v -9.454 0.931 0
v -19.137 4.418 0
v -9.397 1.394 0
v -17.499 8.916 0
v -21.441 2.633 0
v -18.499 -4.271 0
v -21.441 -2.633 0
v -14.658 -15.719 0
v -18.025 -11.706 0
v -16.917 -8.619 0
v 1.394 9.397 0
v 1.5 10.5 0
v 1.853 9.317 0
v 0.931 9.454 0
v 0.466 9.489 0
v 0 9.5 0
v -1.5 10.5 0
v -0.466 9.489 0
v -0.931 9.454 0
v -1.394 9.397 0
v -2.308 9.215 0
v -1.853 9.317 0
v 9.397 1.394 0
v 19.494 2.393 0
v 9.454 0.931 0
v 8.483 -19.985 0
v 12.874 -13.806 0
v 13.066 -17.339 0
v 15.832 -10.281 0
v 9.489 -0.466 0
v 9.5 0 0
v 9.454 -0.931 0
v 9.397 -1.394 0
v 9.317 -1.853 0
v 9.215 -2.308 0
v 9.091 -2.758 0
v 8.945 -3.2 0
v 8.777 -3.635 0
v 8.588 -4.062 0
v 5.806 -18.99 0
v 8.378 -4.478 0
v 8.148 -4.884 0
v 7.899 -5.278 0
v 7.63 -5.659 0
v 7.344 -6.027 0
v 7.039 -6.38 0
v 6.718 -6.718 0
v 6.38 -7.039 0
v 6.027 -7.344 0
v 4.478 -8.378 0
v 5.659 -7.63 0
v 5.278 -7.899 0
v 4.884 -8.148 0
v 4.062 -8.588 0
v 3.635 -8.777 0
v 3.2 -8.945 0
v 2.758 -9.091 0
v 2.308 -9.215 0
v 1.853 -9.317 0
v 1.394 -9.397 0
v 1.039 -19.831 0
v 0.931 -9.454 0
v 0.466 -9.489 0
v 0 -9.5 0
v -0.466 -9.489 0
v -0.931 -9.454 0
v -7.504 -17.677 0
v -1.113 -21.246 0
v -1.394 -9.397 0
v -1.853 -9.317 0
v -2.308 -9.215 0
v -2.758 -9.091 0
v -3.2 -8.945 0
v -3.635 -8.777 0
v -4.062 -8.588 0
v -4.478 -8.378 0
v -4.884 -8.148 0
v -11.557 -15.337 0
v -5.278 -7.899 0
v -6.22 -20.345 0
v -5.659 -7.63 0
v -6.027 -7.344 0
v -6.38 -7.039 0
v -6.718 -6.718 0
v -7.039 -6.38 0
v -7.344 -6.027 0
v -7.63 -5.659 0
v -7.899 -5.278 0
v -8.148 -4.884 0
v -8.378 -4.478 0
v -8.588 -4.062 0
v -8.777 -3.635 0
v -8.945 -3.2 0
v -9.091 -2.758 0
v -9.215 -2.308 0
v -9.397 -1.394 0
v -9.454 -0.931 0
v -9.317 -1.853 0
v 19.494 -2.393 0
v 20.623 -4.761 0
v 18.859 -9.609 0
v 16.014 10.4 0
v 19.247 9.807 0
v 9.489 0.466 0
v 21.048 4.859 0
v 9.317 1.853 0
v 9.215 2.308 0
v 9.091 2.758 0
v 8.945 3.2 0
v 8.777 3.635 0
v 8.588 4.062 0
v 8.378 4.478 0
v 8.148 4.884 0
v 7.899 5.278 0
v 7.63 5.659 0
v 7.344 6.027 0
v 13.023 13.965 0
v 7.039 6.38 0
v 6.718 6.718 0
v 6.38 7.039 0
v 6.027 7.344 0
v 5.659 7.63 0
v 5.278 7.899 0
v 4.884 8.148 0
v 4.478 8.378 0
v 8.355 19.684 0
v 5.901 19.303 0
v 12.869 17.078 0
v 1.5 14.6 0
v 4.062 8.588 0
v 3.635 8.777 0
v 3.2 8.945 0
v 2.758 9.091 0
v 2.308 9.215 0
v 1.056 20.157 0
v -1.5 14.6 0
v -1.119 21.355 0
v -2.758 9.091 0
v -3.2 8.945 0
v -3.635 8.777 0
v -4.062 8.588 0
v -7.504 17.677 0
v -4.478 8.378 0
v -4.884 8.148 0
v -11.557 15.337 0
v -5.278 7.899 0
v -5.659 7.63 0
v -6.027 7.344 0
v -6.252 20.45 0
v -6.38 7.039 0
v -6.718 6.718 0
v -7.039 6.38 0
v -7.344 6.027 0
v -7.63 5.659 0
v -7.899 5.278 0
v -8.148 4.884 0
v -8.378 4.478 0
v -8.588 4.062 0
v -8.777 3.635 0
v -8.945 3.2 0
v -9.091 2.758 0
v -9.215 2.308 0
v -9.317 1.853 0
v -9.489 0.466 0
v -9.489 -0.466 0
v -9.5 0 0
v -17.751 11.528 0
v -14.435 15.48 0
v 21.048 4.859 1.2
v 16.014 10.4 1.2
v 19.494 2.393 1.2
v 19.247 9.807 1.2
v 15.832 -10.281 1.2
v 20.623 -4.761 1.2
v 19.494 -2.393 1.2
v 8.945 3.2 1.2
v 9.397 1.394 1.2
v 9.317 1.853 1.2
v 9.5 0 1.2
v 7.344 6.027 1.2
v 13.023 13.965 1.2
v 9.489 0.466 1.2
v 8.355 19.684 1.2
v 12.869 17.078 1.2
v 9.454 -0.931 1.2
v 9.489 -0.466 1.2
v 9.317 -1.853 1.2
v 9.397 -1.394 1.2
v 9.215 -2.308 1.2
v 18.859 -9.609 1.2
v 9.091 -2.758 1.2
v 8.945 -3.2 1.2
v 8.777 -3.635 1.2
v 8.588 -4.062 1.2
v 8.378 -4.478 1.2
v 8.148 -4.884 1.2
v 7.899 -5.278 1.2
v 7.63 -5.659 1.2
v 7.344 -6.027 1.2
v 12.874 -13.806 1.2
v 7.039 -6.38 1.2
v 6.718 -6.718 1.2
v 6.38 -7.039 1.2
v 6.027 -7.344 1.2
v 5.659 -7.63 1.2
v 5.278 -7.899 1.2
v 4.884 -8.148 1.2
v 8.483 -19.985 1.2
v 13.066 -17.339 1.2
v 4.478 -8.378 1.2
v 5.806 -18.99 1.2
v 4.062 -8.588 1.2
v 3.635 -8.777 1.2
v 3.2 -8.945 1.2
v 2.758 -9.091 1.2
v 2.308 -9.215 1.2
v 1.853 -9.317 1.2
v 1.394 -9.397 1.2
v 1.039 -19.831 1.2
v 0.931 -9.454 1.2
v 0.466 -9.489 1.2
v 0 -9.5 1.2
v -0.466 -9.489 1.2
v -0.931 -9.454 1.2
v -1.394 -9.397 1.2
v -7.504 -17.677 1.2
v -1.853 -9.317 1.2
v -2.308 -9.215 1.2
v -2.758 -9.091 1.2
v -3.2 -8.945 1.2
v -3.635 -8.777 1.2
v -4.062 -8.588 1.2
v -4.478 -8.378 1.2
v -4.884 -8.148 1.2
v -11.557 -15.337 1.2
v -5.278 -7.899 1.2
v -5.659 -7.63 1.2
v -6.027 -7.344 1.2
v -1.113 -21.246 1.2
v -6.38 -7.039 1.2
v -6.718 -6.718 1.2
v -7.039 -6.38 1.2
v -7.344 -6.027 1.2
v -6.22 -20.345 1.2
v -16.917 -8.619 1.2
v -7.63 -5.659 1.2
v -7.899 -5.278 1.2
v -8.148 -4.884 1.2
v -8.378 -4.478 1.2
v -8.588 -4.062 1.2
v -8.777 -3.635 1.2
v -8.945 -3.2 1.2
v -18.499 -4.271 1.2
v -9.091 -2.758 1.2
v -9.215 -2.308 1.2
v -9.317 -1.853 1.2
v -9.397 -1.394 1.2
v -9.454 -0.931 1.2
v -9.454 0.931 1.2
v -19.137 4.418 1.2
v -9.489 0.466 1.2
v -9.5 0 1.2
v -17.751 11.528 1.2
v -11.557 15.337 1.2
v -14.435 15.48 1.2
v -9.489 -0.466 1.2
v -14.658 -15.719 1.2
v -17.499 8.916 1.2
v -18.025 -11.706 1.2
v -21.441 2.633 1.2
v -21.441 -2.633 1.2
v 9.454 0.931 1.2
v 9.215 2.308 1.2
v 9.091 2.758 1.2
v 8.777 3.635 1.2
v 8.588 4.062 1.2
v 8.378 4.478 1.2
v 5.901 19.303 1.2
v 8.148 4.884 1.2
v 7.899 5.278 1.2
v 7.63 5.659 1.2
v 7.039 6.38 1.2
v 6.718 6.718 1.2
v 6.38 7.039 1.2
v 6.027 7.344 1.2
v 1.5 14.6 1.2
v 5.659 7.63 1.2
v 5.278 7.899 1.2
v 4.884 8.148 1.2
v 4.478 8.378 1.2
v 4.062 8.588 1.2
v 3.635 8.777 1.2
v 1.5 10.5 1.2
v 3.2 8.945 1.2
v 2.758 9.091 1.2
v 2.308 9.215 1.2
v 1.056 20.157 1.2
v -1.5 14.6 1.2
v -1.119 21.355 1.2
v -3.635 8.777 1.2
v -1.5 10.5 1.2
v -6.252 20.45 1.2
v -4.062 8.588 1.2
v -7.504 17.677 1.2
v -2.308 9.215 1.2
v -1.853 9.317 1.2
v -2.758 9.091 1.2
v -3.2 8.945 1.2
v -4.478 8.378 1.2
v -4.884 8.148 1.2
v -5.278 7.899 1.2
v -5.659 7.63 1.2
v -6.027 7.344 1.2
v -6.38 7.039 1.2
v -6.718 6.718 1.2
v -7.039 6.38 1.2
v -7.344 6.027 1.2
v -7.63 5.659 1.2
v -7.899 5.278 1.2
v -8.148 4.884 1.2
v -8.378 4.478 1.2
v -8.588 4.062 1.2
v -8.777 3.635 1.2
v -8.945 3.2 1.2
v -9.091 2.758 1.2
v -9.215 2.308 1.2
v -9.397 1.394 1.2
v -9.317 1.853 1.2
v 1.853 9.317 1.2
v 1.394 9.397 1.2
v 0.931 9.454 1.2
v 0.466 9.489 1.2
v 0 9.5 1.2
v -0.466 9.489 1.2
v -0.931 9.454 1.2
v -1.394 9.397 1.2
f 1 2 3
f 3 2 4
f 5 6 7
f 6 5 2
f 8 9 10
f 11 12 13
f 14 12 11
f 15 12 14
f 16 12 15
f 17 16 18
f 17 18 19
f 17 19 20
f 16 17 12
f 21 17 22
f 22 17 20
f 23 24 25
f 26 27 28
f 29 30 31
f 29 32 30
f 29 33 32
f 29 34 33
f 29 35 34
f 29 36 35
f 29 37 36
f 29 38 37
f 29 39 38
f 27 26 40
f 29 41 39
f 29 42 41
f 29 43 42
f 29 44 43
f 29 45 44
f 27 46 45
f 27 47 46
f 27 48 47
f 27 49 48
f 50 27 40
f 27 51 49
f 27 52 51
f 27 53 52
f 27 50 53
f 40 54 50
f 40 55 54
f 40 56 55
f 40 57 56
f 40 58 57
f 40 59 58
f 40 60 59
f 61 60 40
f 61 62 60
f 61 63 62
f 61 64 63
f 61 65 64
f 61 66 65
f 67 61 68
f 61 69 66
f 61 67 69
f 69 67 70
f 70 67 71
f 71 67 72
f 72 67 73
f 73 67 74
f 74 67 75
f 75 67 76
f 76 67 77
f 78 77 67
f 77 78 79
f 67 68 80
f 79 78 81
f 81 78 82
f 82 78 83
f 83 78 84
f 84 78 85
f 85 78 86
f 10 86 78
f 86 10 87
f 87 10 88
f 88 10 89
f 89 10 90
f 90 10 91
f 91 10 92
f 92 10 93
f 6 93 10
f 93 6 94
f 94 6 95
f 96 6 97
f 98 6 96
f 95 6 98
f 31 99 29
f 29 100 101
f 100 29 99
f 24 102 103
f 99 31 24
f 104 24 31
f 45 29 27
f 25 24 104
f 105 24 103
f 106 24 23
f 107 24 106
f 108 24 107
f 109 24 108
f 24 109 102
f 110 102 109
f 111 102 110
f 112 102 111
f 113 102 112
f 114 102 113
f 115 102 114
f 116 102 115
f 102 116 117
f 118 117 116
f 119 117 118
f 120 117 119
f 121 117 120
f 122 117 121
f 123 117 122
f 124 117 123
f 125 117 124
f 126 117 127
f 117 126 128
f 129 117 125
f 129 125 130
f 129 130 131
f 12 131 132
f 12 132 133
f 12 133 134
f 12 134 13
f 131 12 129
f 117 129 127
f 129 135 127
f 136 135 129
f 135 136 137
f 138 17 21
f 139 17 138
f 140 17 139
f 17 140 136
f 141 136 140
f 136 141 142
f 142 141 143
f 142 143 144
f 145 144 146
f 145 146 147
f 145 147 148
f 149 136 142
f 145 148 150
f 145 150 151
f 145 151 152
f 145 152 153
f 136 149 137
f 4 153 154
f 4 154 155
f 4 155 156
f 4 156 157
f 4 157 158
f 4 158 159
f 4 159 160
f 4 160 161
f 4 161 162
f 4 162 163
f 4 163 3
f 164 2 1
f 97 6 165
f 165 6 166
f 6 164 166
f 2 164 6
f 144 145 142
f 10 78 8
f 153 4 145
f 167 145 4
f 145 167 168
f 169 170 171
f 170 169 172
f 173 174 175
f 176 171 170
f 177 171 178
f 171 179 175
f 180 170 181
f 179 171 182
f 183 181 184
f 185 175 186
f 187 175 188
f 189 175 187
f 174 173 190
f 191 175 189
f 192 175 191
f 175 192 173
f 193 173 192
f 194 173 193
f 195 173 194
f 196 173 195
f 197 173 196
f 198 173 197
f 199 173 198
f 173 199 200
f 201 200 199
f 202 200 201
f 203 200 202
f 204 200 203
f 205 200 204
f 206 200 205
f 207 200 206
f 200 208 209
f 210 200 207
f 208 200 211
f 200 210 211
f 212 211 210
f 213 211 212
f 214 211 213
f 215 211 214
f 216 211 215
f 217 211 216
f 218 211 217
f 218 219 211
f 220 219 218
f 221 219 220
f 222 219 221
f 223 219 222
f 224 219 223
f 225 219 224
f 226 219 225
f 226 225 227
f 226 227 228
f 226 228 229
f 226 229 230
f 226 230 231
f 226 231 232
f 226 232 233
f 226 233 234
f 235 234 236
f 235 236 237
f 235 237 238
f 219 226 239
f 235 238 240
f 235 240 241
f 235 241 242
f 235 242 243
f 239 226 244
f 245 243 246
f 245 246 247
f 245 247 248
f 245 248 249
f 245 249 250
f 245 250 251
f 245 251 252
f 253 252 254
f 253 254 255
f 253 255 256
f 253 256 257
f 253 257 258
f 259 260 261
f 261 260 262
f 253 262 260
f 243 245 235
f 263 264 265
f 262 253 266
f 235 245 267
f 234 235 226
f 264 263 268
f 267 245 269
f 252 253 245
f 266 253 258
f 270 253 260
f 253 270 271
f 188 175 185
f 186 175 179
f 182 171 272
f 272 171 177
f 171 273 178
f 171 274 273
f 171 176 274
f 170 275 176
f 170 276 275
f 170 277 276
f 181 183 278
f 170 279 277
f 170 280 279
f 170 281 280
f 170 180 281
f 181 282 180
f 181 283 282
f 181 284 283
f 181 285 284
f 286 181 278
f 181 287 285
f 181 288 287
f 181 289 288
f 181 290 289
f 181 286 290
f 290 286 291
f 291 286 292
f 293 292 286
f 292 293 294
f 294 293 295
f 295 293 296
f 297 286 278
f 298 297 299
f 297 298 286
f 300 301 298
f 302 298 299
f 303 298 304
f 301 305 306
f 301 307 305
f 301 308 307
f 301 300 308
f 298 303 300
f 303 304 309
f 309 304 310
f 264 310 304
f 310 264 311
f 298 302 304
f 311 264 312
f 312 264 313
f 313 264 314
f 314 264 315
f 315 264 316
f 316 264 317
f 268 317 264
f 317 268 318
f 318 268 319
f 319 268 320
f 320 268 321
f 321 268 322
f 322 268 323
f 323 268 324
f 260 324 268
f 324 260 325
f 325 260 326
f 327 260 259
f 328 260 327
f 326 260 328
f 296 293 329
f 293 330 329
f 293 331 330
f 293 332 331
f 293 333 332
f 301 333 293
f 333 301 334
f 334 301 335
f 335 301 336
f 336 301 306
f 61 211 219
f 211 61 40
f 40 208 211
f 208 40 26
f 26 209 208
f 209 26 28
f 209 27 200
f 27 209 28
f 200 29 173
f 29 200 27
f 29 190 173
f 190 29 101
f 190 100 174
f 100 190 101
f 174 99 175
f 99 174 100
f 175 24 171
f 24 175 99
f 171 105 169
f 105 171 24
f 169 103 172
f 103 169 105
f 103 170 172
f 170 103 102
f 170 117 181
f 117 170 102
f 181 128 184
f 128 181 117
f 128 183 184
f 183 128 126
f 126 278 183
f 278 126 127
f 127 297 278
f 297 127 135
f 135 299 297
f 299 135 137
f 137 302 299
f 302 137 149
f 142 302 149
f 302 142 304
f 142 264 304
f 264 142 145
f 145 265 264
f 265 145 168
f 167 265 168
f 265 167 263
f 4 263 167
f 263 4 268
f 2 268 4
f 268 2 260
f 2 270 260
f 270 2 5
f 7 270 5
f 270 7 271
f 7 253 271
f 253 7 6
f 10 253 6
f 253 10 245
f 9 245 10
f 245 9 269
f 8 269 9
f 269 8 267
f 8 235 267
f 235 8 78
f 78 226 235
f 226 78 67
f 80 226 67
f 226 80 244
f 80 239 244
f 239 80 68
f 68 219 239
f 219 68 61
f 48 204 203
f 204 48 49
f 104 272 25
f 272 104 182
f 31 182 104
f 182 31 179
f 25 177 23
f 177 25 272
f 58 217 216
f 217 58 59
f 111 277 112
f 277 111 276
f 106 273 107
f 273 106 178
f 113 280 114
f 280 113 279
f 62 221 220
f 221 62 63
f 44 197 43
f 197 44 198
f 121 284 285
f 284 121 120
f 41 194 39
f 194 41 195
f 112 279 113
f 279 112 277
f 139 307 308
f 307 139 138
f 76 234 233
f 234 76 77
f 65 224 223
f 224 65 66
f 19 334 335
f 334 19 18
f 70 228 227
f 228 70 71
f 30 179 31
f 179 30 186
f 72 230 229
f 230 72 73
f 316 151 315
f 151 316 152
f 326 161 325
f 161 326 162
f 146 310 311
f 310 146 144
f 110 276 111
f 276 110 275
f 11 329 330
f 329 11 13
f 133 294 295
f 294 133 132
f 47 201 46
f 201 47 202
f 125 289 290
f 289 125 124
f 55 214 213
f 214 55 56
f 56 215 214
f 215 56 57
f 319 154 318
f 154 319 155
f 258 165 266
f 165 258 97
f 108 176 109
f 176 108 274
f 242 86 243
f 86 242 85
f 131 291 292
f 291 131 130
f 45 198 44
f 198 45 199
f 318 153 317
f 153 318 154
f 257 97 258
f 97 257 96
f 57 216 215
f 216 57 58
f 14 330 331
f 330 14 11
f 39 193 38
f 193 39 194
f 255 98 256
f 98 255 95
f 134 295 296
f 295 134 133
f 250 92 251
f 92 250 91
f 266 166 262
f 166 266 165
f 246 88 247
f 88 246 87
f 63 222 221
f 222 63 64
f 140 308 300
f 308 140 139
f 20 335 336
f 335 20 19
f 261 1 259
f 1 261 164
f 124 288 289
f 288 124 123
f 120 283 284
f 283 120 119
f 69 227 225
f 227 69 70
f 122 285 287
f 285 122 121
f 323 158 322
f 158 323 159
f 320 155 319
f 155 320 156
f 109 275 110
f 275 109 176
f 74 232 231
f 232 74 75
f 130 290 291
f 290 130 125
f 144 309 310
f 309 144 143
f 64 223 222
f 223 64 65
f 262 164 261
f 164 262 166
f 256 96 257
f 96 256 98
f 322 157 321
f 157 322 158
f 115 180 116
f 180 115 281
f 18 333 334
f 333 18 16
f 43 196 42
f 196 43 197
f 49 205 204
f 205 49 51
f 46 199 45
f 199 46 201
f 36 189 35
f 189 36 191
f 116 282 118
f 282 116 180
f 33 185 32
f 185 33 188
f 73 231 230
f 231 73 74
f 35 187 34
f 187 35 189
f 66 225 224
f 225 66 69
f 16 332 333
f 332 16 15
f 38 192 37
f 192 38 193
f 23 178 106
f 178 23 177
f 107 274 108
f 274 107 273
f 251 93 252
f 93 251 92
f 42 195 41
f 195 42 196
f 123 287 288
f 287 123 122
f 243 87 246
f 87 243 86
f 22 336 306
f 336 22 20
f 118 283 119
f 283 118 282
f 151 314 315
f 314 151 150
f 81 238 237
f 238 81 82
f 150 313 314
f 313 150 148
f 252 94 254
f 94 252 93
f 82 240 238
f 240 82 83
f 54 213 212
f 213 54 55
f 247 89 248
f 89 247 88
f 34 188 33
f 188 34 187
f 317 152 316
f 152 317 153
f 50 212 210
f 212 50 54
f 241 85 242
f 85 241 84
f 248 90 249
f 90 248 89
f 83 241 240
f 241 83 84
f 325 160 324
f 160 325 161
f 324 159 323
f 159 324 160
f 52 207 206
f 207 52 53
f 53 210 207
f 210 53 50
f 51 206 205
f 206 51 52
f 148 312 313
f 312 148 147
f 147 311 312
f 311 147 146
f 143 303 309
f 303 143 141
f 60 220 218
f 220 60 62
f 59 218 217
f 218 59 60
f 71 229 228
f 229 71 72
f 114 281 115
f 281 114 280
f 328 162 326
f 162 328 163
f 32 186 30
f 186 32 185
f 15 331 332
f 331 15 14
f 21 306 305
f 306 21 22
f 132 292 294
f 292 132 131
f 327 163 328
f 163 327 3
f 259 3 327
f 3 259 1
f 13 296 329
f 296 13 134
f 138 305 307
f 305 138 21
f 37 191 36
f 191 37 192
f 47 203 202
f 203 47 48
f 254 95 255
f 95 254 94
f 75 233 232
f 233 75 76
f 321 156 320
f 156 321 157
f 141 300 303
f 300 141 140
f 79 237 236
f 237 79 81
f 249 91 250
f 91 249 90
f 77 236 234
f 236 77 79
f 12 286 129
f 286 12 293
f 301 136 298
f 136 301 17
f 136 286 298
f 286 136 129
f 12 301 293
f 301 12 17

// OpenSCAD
/*
  Elna Supermatic cam 27
  Name: Irregular pulse
  Status: candidate

  Generated from measured parametric base v2.
  Surface mode: stepped
*/

include <_elna_measured_common.scad>;

profile_points = [
        [1.0564, 20.1573],
        [5.9015, 19.3030],
        [8.3554, 19.6841],
        [12.8692, 17.0780],
        [13.0228, 13.9652],
        [16.0144, 10.3999],
        [19.2475, 9.8071],
        [21.0483, 4.8594],
        [19.4936, 2.3935],
        [19.4936, -2.3935],
        [20.6235, -4.7613],
        [18.8590, -9.6092],
        [15.8316, -10.2812],
        [12.8741, -13.8058],
        [13.0660, -17.3392],
        [8.4832, -19.9851],
        [5.8059, -18.9903],
        [1.0393, -19.8308],
        [-1.1134, -21.2458],
        [-6.2202, -20.3454],
        [-7.5036, -17.6774],
        [-11.5573, -15.3370],
        [-14.6582, -15.7190],
        [-18.0255, -11.7059],
        [-16.9166, -8.6195],
        [-18.4994, -4.2709],
        [-21.4410, -2.6326],
        [-21.4410, 2.6326],
        [-19.1366, 4.4180],
        [-17.4994, 8.9164],
        [-17.7513, 11.5278],
        [-14.4352, 15.4798],
        [-11.5573, 15.3370],
        [-7.5036, 17.6774],
        [-6.2521, 20.4496],
        [-1.1192, 21.3547]
];

icon_points = [[-1.000,0.200], [-0.880,0.620], [-0.760,0.860], [-0.640,0.620], [-0.520,0.200], [-0.300,0.200], [-0.180,0.620], [-0.060,0.860], [0.060,0.620], [0.180,0.200], [0.400,0.200], [0.520,0.620], [0.640,0.860], [0.760,0.620], [0.880,0.200], [1.000,0.200]];

elna_cam_ring(profile_points=profile_points);
